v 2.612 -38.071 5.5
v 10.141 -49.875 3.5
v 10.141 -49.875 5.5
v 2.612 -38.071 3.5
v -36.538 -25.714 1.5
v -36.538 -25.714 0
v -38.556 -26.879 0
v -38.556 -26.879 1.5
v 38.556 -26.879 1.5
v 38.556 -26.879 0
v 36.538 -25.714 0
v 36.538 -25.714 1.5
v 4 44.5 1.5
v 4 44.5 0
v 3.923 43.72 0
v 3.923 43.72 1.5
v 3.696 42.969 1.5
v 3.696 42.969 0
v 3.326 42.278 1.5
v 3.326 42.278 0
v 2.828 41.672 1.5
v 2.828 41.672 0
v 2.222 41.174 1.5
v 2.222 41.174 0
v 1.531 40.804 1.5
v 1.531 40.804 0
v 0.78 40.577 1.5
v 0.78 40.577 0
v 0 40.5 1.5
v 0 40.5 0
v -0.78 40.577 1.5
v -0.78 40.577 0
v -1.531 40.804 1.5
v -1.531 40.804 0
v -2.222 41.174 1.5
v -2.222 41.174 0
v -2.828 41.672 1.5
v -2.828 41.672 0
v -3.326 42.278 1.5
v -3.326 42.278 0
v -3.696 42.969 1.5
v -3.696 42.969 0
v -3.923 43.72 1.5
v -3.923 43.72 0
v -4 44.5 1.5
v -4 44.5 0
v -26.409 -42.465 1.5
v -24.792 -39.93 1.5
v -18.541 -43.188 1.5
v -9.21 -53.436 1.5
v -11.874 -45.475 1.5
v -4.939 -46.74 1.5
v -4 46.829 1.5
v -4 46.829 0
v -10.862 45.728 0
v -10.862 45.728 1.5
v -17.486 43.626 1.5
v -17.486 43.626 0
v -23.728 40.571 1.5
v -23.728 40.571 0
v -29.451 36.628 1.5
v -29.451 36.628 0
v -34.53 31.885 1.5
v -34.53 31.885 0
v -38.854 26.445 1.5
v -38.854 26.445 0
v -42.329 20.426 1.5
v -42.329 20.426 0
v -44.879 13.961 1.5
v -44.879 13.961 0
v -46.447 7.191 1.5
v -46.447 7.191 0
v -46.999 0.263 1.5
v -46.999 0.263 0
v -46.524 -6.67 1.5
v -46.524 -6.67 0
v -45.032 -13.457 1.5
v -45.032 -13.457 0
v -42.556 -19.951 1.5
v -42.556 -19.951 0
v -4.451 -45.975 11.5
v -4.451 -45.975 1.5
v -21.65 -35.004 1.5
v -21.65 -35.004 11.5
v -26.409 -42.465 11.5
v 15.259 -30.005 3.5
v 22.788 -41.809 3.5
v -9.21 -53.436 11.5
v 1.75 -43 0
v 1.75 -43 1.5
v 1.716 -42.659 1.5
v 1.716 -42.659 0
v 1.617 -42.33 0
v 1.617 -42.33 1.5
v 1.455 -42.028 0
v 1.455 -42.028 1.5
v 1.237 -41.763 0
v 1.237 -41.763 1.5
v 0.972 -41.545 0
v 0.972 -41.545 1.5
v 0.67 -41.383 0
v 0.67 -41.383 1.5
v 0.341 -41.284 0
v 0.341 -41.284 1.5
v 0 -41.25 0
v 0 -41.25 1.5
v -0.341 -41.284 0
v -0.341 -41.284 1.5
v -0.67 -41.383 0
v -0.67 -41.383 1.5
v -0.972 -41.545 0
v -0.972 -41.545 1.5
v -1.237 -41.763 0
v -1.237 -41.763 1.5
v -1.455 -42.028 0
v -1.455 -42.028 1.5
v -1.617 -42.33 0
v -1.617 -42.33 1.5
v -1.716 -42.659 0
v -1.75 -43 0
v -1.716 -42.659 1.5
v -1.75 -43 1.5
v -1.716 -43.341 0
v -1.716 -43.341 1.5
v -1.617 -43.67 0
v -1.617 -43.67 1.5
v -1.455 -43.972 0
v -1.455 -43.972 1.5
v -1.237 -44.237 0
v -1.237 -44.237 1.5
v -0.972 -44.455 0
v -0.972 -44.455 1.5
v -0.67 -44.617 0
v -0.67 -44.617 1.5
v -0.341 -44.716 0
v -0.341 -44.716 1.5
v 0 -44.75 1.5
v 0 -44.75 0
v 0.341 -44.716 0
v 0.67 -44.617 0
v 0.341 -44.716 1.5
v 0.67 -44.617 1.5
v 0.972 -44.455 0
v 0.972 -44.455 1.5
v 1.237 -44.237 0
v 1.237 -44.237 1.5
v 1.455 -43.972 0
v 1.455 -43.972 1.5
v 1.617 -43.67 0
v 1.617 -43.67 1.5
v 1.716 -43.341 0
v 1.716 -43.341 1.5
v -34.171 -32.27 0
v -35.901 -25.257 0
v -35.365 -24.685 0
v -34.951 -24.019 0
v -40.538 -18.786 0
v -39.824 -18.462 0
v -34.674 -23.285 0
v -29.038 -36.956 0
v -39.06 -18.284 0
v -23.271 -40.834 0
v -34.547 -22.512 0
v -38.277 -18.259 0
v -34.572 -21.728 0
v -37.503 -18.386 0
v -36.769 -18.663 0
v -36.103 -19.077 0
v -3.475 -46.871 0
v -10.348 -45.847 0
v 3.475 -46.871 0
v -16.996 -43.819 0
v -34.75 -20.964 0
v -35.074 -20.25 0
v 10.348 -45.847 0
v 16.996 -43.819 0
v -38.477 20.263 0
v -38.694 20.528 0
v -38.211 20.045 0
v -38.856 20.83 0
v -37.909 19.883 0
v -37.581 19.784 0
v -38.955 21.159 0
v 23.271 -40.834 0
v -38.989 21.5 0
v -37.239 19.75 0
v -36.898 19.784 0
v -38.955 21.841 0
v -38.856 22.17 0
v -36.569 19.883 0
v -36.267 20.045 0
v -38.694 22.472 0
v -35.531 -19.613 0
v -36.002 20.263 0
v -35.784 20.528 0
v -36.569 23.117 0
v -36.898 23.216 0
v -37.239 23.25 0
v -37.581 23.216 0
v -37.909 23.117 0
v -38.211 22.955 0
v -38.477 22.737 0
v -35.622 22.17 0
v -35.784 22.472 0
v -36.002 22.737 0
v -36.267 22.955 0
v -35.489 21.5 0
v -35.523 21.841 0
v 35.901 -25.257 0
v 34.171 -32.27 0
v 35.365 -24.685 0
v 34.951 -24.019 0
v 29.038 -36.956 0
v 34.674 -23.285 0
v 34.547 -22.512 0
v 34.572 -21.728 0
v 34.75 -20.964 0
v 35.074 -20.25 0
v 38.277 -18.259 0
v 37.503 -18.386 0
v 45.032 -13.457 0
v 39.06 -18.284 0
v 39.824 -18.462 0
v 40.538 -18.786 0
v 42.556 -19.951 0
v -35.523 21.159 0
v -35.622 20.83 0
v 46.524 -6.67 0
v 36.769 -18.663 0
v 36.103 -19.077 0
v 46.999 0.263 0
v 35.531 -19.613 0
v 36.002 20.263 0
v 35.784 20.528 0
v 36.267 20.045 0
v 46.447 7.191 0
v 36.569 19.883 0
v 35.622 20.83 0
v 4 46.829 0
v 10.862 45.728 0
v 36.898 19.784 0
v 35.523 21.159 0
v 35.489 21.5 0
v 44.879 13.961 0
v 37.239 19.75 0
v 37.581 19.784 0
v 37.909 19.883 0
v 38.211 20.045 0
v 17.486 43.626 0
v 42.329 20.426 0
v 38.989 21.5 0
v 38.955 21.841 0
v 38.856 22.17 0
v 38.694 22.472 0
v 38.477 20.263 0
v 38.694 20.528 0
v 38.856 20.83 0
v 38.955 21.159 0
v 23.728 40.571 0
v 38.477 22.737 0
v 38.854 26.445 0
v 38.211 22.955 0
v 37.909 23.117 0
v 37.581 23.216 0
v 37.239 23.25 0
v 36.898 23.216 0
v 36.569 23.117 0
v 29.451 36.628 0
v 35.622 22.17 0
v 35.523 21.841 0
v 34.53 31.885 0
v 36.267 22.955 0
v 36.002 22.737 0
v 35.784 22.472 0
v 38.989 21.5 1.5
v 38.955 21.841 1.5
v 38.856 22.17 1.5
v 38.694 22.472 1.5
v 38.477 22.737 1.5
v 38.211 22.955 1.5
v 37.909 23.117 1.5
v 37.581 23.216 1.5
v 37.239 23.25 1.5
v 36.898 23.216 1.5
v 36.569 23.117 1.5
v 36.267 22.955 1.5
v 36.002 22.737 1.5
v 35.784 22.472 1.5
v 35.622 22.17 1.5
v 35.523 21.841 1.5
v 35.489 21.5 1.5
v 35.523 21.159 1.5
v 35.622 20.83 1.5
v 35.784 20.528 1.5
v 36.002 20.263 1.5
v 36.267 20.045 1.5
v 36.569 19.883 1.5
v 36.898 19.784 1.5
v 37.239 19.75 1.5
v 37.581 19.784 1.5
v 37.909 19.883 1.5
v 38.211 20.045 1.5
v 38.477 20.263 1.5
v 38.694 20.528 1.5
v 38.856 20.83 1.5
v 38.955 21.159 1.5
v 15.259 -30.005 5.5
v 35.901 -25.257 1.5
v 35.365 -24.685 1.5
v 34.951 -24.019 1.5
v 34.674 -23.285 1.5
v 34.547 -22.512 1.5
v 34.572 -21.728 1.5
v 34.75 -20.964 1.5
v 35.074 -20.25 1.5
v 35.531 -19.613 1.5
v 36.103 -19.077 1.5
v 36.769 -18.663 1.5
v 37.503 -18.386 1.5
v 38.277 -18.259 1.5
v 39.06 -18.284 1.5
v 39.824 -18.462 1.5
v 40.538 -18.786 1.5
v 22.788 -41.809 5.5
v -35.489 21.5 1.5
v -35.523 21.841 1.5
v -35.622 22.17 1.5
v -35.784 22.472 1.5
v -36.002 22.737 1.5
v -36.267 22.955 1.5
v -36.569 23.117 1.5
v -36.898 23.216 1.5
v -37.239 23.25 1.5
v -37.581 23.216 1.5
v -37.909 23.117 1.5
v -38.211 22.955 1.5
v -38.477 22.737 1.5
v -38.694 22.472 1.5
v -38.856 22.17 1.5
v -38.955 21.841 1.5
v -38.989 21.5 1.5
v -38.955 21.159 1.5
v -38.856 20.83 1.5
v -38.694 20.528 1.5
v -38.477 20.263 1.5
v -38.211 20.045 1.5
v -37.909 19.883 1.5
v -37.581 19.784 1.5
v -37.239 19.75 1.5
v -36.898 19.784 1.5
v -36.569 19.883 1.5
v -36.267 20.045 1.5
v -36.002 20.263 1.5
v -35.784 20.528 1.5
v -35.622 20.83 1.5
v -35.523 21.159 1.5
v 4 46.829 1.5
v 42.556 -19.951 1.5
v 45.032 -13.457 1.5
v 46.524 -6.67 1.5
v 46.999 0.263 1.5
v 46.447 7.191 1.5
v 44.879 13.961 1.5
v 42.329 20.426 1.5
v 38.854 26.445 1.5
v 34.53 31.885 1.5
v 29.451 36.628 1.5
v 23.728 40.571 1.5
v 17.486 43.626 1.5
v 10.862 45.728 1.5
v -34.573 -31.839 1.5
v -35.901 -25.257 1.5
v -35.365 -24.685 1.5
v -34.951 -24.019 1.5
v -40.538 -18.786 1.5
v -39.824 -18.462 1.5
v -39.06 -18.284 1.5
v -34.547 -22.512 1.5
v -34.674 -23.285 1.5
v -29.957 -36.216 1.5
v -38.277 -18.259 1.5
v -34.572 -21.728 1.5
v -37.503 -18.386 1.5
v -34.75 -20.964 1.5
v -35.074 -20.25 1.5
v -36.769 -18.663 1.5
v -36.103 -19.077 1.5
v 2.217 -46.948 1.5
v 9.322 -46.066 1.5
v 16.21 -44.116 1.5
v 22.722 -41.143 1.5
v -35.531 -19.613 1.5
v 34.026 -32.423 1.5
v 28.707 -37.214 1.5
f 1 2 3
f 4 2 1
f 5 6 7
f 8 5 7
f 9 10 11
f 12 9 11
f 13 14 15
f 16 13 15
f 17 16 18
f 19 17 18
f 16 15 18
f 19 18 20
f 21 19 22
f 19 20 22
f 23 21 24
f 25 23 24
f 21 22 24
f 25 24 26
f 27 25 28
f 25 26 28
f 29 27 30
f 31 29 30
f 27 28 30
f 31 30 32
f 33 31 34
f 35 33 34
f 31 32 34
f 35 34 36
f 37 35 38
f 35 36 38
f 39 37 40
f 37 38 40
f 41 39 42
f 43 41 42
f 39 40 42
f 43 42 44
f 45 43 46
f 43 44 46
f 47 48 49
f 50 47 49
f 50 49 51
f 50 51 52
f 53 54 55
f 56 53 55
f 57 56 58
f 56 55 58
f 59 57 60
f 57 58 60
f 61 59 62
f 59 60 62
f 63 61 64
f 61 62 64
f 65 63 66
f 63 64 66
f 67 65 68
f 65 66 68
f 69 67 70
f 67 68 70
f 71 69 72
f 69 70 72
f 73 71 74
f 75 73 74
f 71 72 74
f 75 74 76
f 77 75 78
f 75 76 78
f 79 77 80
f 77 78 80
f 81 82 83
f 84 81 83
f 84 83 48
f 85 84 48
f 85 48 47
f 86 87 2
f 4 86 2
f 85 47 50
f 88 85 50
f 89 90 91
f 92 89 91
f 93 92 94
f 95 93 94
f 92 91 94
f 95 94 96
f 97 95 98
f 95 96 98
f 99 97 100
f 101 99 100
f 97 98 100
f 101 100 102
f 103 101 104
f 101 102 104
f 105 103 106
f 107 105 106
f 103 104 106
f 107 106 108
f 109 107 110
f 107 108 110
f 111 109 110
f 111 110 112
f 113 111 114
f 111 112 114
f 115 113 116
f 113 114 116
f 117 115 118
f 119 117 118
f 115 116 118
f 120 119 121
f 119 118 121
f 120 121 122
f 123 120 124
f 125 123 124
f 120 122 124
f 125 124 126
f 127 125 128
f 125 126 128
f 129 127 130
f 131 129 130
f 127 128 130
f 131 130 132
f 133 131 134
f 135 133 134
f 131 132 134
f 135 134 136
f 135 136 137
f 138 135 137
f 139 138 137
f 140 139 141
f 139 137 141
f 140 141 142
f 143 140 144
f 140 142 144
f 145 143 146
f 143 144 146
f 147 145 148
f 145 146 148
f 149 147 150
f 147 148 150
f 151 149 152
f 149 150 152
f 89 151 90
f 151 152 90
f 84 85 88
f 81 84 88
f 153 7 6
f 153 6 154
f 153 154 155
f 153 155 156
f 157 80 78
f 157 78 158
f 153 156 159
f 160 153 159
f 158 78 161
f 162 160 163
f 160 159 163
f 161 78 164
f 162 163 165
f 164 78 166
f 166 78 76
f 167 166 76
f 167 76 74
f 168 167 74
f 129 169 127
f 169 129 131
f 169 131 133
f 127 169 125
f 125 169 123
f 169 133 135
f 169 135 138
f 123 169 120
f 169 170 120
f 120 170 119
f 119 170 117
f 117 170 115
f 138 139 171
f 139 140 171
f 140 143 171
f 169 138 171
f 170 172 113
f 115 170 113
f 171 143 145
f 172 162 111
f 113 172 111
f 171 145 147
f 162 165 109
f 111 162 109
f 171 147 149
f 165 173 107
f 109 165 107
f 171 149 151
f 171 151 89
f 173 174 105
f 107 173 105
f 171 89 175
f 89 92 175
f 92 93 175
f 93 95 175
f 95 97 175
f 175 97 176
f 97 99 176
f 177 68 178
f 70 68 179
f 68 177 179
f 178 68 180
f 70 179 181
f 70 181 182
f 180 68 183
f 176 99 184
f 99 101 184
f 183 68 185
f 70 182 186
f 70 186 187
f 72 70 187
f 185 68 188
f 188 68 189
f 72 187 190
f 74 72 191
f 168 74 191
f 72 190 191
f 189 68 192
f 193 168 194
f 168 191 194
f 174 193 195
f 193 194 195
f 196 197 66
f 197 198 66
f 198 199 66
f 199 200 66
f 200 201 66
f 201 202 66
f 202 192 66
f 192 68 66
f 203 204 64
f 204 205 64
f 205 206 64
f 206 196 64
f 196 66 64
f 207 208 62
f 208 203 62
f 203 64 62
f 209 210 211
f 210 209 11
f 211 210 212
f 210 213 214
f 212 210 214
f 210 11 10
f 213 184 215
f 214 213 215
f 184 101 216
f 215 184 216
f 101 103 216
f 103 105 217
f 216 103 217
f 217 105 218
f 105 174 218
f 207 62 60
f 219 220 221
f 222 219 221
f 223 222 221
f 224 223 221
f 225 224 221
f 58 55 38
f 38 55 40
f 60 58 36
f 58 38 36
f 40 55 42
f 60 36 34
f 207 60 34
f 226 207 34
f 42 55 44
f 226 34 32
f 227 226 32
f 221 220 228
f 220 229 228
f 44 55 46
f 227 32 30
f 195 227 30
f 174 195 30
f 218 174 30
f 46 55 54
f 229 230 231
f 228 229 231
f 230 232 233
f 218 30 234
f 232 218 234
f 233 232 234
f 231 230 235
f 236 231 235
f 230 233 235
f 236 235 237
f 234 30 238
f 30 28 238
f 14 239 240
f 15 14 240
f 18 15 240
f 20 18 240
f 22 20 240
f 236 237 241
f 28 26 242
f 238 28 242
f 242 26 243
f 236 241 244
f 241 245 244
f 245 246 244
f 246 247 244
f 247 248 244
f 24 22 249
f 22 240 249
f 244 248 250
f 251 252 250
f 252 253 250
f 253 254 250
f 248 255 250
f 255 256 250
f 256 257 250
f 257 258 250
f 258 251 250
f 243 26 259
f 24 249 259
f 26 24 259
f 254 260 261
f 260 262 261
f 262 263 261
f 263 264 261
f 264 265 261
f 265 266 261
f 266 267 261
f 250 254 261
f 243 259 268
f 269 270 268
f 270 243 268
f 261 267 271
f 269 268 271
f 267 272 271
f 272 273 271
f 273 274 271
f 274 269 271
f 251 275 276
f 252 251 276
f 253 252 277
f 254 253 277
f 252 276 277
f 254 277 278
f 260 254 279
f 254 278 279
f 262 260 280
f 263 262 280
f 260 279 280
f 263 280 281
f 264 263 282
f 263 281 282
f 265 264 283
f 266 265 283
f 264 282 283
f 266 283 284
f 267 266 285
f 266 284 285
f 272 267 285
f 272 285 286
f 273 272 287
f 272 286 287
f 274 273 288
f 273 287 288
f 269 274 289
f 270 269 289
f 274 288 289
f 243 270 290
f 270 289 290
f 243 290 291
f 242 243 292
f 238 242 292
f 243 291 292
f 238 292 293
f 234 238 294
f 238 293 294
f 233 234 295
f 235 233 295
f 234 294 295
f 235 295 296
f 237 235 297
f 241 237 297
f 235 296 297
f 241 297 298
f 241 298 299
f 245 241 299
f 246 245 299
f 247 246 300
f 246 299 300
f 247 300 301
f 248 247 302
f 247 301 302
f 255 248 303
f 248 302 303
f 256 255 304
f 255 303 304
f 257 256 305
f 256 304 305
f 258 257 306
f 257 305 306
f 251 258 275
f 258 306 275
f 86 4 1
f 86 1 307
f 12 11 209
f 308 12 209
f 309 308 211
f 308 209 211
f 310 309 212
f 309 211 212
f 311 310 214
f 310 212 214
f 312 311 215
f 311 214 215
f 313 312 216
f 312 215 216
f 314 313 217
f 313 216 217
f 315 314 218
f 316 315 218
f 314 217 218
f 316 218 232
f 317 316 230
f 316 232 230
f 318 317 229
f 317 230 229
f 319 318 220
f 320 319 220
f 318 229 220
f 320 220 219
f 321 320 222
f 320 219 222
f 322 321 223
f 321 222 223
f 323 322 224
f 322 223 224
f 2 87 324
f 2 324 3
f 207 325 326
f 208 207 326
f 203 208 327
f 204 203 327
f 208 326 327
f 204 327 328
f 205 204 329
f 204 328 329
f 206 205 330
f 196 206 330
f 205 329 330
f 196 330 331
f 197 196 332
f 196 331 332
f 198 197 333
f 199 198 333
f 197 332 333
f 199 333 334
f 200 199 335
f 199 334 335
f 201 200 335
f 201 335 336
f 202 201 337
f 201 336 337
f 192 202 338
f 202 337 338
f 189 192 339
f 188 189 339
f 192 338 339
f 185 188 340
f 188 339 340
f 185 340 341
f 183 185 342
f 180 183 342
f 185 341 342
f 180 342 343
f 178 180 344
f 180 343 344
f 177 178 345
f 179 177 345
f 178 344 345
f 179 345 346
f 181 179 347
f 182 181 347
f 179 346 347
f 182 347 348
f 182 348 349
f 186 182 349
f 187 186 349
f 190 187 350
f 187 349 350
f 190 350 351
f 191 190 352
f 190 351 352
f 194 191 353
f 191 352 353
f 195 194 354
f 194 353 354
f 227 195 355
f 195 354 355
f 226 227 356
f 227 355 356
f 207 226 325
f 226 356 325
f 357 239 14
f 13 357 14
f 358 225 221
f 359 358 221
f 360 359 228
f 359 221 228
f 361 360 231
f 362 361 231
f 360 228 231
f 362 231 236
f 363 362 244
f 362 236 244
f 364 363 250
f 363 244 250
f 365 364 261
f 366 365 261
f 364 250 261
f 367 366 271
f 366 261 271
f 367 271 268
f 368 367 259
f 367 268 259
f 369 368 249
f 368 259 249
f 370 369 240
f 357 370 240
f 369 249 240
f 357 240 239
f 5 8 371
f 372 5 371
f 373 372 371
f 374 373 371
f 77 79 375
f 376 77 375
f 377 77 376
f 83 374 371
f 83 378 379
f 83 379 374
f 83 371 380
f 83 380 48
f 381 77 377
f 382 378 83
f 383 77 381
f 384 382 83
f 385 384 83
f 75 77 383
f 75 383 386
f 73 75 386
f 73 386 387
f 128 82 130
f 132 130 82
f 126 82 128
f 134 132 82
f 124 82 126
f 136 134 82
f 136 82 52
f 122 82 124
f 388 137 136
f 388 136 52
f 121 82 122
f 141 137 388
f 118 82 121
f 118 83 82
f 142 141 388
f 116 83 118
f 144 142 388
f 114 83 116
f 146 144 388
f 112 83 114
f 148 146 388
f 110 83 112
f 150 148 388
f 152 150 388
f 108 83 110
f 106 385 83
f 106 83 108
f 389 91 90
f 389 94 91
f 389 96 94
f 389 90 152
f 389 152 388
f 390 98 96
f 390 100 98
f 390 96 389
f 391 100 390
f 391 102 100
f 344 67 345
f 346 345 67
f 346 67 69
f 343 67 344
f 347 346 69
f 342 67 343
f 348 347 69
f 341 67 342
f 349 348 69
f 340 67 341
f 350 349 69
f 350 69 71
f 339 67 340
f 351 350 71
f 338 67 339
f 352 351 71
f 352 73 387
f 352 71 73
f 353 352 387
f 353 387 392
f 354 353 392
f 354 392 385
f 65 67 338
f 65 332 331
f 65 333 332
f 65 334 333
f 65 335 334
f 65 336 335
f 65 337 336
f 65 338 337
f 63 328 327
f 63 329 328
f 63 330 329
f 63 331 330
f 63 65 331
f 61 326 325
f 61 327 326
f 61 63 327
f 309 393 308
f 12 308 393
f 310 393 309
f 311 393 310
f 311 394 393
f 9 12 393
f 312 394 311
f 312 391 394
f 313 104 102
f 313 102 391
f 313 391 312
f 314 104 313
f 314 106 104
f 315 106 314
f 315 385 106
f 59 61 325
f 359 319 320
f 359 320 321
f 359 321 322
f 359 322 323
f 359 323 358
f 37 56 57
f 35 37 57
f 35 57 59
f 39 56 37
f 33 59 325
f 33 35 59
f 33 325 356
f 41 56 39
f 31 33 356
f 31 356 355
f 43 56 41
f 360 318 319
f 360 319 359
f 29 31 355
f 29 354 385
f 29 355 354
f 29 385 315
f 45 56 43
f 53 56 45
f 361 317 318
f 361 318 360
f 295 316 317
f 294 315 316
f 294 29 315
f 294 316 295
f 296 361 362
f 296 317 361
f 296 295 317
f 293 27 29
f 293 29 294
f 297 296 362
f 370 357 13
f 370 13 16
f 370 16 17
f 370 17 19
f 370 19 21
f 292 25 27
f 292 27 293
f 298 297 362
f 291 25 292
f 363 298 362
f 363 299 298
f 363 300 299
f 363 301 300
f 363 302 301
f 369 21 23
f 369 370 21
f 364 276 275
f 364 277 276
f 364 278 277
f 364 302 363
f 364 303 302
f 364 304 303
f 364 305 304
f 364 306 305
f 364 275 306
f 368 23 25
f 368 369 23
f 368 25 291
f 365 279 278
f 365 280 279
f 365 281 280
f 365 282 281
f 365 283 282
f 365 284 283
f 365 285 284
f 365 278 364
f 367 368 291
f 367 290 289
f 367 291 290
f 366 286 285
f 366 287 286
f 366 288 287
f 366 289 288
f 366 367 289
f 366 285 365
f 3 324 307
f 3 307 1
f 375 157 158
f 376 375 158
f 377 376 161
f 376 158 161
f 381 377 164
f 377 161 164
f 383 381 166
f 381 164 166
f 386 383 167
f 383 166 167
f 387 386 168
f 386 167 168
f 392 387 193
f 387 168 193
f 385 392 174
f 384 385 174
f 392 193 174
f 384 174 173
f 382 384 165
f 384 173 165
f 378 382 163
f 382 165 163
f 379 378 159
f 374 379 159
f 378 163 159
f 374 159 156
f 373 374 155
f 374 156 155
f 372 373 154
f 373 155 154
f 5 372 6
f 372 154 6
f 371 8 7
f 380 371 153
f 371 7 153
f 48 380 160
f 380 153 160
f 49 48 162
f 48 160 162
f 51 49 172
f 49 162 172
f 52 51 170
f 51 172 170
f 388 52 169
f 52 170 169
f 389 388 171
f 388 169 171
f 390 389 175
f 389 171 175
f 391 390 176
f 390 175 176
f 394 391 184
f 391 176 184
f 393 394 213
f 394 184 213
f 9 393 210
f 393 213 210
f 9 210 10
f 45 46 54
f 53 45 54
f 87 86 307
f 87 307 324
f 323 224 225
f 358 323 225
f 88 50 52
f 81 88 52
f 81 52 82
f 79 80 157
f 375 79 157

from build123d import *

# Parameters (mm, degrees)
SALIENTE_EXTRUIR1_DEPTH = 1.5
CROQUIS2_R              = 1.75
CORTAR_EXTRUIR1_DEPTH   = 1.5
SALIENTE_EXTRUIR2_START = 2
SALIENTE_EXTRUIR2_DEPTH = 2
SALIENTE_EXTRUIR3_DEPTH = 10


with BuildPart() as part:
    # Croquis1 → Saliente-Extruir1 (new body)
    with BuildSketch(Plane.XY):
        with BuildLine():
            Line((-4, 44.5), (-4, 46.829477896))
            ThreePointArc((-4, 46.829477896), (-40.703193978, 23.5), (-42.555517504, -19.950637333))
            Line((-42.555517504, -19.950637333), (-40.538130468, -18.785898385))
            ThreePointArc((-40.538130468, -18.785898385), (-35.074028853, -20.25), (-36.538130468, -25.714101615))
            Line((-36.538130468, -25.714101615), (-38.555517504, -26.878840563))
            ThreePointArc((-38.555517504, -26.878840563), (0, -47), (38.555517504, -26.878840563))
            Line((38.555517504, -26.878840563), (36.538130468, -25.714101615))
            ThreePointArc((36.538130468, -25.714101615), (35.074028853, -20.25), (40.538130468, -18.785898385))
            Line((40.538130468, -18.785898385), (42.555517504, -19.950637333))
            ThreePointArc((42.555517504, -19.950637333), (40.703193978, 23.5), (4, 46.829477896))
            Line((4, 46.829477896), (4, 44.5))
            ThreePointArc((4, 44.5), (0, 40.5), (-4, 44.5))
        make_face()
    extrude(amount=SALIENTE_EXTRUIR1_DEPTH)

    # Croquis2 → Cortar-Extruir1 (cut)
    with BuildSketch(Plane.XY.offset(1.5)):
        with Locations((-37.239092363, 21.5)):
            Circle(CROQUIS2_R)
        with Locations((37.239092363, 21.5)):
            Circle(CROQUIS2_R)
        with Locations((0, -43)):
            Circle(CROQUIS2_R)
    extrude(amount=-CORTAR_EXTRUIR1_DEPTH, mode=Mode.SUBTRACT)

    # Croquis4 → Saliente-Extruir3 (add)
    with BuildSketch(Plane.XY.offset(1.5)):
        Polygon((-26.409104031, -42.465035702), (-9.210425901, -53.436155545), (-4.450895969, -45.974964298), (-21.649574099, -35.003844455), align=None)
    extrude(amount=SALIENTE_EXTRUIR3_DEPTH)


with BuildPart() as body_2:
    # Croquis3 → Saliente-Extruir2 (new body)
    with BuildSketch(Plane.XY.offset(1.5).offset(SALIENTE_EXTRUIR2_START)):
        Polygon((15.259137072, -30.005171494), (22.78751294, -41.808711505), (10.140862928, -49.874828506), (2.61248706, -38.071288495), align=None)
    extrude(amount=SALIENTE_EXTRUIR2_DEPTH)


solid = Compound([part.part, body_2.part])
